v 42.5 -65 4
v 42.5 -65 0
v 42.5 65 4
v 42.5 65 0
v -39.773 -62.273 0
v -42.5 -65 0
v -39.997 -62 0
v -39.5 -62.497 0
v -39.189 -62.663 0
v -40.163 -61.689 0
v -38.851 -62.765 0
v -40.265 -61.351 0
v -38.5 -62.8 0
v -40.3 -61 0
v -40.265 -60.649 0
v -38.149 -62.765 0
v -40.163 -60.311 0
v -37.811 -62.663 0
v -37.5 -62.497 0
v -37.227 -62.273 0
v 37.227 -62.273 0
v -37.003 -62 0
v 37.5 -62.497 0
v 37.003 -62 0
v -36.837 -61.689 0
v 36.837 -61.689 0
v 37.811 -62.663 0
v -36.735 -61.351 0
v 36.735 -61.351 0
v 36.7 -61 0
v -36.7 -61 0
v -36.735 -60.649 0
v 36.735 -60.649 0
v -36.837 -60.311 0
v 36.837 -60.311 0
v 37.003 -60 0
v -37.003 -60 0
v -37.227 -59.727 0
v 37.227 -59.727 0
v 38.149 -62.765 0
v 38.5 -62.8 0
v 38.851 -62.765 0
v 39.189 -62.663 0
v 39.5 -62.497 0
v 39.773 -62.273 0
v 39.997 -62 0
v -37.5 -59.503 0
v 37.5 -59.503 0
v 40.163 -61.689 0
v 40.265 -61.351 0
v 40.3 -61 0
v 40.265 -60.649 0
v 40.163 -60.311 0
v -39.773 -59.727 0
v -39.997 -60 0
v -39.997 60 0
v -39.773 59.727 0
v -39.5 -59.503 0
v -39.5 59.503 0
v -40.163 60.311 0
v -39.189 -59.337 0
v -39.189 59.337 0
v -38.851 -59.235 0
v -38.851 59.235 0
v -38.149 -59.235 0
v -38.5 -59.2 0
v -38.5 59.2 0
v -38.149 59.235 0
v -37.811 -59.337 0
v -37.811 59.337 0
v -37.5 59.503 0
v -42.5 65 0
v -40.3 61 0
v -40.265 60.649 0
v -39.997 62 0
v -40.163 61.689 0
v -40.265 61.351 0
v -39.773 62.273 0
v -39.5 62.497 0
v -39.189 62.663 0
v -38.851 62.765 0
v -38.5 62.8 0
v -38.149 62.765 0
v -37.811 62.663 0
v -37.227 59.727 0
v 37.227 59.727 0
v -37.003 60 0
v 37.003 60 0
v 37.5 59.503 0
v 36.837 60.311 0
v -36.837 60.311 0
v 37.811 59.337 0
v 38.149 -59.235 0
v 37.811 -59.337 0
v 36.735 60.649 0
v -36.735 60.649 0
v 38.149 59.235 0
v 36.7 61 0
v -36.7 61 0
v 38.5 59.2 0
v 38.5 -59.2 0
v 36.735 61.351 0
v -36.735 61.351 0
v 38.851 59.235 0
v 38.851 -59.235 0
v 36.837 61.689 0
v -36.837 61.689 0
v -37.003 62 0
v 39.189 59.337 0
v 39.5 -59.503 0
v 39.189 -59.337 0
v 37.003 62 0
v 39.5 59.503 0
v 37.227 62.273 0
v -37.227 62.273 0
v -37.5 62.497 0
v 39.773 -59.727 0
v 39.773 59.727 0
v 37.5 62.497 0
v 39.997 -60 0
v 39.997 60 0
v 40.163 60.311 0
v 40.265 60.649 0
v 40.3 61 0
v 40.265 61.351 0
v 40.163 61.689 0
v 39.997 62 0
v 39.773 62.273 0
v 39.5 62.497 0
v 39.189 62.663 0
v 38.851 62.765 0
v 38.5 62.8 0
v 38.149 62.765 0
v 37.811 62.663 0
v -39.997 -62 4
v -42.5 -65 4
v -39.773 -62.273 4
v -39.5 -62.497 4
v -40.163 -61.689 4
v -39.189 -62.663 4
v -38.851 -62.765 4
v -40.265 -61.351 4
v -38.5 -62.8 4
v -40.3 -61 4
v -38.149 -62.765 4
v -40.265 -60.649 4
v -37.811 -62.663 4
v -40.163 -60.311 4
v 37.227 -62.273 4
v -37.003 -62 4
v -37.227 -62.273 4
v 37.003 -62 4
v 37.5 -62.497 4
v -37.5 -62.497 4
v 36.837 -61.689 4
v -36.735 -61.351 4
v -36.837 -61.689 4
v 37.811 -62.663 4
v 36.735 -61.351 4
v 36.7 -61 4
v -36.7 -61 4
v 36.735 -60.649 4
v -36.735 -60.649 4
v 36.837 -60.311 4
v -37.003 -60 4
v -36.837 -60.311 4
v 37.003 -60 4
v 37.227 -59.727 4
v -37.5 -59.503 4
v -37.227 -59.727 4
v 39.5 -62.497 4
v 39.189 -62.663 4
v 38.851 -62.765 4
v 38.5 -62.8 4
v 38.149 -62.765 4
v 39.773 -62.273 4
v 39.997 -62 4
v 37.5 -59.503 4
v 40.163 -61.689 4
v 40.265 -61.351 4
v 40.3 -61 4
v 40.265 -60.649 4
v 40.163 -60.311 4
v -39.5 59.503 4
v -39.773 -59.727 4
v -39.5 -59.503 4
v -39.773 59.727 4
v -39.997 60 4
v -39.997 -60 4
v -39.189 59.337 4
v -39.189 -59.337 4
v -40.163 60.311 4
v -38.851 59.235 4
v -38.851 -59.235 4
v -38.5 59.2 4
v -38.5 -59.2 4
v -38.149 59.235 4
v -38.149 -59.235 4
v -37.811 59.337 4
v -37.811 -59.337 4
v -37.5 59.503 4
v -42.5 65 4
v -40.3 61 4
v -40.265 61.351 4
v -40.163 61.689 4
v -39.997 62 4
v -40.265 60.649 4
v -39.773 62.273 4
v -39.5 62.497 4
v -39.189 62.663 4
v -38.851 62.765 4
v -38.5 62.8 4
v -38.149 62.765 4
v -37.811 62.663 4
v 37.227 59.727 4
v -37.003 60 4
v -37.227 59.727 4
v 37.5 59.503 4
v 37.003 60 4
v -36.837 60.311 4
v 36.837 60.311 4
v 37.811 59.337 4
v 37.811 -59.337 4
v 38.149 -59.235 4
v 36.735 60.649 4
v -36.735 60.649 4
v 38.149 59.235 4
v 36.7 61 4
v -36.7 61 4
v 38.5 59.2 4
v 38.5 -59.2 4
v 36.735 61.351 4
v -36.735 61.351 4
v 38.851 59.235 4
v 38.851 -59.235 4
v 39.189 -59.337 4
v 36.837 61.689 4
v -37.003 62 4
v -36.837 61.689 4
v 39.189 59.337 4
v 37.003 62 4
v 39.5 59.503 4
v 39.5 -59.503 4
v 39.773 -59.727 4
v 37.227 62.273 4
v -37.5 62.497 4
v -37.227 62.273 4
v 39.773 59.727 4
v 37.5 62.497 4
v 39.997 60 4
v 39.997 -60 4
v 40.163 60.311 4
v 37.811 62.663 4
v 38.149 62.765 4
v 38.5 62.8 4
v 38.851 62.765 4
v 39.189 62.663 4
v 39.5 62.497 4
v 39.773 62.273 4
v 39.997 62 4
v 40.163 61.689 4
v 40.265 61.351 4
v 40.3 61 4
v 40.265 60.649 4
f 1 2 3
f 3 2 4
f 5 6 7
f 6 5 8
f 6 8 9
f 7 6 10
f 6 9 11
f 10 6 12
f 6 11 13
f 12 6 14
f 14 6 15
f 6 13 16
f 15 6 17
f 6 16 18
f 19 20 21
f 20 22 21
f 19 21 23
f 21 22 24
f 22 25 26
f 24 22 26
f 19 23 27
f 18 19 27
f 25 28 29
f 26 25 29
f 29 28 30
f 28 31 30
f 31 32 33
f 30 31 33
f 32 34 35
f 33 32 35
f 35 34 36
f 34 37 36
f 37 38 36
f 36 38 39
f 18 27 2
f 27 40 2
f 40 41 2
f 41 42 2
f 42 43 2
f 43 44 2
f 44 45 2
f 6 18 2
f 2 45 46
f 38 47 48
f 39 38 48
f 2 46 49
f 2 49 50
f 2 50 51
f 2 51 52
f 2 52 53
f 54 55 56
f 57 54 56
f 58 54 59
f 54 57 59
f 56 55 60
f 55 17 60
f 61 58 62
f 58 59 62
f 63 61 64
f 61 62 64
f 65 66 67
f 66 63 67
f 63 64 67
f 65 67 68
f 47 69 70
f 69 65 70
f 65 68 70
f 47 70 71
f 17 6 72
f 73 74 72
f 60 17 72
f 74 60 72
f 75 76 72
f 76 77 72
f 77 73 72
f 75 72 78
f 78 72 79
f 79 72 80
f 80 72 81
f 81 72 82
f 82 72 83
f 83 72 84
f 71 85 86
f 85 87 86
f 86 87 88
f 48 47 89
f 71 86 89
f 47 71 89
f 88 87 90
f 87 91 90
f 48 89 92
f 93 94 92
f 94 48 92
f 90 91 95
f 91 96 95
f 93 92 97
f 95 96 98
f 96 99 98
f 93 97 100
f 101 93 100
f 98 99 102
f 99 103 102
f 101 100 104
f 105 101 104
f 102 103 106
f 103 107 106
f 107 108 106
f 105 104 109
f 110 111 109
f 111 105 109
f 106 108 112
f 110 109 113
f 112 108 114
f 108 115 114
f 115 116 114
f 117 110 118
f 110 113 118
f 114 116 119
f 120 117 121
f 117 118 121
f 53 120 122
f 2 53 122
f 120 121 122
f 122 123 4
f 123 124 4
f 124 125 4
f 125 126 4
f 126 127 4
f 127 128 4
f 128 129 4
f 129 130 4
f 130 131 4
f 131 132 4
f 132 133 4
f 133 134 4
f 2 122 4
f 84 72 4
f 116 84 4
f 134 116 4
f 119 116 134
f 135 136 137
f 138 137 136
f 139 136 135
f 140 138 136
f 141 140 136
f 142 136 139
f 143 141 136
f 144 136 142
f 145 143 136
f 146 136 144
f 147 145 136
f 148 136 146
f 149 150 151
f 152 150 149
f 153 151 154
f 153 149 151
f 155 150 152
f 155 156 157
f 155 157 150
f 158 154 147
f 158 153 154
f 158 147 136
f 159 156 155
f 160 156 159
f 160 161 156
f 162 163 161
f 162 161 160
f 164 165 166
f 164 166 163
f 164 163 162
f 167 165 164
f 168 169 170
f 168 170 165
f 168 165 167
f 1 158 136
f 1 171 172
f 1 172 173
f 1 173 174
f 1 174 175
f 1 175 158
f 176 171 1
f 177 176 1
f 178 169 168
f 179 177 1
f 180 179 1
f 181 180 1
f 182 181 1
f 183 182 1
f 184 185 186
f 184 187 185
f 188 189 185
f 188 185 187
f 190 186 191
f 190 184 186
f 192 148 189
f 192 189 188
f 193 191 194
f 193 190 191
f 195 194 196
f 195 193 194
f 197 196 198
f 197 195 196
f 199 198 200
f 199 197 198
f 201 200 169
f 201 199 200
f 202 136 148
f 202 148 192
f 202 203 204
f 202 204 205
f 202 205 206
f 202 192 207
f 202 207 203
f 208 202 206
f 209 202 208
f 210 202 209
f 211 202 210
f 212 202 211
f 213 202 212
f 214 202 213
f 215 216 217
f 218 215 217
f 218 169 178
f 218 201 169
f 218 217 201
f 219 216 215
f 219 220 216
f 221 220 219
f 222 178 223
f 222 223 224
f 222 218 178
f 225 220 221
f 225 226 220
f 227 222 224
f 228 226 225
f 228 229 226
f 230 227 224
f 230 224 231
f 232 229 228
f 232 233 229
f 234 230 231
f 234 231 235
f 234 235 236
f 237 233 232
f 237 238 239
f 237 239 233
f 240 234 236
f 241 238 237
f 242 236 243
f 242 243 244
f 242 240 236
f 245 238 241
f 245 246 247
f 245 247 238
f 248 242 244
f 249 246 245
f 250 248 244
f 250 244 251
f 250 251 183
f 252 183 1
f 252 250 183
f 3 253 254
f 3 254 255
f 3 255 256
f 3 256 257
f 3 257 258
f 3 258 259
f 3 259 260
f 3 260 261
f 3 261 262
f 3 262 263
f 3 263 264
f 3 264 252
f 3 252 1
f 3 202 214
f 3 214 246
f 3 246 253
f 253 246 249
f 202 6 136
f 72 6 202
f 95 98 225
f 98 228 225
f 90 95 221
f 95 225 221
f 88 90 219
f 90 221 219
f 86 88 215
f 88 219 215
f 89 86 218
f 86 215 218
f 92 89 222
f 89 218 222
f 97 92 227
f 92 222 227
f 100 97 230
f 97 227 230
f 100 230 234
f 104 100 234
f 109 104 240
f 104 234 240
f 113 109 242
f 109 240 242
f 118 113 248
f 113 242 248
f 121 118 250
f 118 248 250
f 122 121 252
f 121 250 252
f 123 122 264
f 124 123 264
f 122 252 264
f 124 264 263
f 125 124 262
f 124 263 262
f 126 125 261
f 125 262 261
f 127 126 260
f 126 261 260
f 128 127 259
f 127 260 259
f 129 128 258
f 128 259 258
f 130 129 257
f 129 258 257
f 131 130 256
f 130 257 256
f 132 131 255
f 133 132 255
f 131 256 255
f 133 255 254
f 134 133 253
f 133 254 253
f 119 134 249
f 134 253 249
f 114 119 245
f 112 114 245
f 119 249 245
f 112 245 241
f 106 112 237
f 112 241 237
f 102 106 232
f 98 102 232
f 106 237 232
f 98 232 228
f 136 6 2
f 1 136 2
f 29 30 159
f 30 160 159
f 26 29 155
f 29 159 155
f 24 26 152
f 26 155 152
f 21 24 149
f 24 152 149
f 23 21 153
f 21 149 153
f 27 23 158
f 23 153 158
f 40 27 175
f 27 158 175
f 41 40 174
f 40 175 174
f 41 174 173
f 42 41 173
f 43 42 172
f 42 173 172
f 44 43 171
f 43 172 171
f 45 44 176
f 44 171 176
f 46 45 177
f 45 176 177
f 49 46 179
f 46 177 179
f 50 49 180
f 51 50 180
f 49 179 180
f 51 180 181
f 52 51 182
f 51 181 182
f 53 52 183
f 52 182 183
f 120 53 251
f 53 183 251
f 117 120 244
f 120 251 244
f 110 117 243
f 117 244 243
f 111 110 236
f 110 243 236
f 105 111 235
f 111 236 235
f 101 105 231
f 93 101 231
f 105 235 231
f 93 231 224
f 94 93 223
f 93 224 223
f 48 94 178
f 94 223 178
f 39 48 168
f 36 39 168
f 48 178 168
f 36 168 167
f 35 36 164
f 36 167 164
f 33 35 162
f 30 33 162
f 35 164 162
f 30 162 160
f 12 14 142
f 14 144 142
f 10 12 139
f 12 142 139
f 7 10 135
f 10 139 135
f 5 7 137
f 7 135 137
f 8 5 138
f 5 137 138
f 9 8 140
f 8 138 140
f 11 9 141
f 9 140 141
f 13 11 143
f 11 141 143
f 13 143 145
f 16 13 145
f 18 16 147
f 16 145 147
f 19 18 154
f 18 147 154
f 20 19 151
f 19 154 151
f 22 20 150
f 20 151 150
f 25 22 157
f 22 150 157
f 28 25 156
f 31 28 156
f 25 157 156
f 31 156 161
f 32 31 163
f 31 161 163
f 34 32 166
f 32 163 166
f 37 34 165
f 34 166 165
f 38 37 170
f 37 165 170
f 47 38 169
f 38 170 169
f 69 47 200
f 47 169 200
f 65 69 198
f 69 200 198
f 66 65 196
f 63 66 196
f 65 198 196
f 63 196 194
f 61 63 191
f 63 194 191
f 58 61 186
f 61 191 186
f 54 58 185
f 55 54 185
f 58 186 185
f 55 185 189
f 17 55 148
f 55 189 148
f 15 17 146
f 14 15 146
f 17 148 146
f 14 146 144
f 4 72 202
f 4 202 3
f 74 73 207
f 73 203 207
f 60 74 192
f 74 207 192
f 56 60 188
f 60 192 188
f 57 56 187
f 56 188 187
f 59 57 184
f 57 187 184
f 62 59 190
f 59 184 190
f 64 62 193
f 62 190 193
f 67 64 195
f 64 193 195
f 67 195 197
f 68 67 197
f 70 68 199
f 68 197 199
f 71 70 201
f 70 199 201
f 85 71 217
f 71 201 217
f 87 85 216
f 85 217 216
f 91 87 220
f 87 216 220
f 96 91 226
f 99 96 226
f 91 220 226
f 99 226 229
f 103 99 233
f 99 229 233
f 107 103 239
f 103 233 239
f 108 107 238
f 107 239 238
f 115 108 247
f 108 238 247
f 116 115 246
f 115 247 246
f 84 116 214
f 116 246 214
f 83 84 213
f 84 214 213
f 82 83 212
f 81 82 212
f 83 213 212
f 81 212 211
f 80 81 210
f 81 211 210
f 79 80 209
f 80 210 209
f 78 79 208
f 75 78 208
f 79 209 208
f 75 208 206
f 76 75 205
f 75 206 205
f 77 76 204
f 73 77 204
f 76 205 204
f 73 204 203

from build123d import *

# Parameters (mm, degrees)
F2_W     = 85
F2_H     = 130
F3_DEPTH = 4
F4_D     = 3.6
F4_DEPTH = 4
F4_TIP   = 1.0815491142


with BuildPart() as f3:
    # F2 (on Top) → F3 (new body)
    with BuildSketch(Plane.XY):
        Rectangle(F2_W, F2_H)
    extrude(amount=F3_DEPTH)

    # F4
    with Locations(Plane(origin=(0, 0, 0), x_dir=(1, 0, 0), z_dir=(0, 0, -1))):
        with Locations((38.5, -61), (38.5, 61), (-38.5, 61), (-38.5, -61)):
            Hole(F4_D / 2, depth=F4_DEPTH)
            with Locations((0, 0, -(F4_DEPTH + F4_TIP / 2))):  # 118° drill point
                Cone(0, F4_D / 2, F4_TIP, mode=Mode.SUBTRACT)


solid = f3.part
